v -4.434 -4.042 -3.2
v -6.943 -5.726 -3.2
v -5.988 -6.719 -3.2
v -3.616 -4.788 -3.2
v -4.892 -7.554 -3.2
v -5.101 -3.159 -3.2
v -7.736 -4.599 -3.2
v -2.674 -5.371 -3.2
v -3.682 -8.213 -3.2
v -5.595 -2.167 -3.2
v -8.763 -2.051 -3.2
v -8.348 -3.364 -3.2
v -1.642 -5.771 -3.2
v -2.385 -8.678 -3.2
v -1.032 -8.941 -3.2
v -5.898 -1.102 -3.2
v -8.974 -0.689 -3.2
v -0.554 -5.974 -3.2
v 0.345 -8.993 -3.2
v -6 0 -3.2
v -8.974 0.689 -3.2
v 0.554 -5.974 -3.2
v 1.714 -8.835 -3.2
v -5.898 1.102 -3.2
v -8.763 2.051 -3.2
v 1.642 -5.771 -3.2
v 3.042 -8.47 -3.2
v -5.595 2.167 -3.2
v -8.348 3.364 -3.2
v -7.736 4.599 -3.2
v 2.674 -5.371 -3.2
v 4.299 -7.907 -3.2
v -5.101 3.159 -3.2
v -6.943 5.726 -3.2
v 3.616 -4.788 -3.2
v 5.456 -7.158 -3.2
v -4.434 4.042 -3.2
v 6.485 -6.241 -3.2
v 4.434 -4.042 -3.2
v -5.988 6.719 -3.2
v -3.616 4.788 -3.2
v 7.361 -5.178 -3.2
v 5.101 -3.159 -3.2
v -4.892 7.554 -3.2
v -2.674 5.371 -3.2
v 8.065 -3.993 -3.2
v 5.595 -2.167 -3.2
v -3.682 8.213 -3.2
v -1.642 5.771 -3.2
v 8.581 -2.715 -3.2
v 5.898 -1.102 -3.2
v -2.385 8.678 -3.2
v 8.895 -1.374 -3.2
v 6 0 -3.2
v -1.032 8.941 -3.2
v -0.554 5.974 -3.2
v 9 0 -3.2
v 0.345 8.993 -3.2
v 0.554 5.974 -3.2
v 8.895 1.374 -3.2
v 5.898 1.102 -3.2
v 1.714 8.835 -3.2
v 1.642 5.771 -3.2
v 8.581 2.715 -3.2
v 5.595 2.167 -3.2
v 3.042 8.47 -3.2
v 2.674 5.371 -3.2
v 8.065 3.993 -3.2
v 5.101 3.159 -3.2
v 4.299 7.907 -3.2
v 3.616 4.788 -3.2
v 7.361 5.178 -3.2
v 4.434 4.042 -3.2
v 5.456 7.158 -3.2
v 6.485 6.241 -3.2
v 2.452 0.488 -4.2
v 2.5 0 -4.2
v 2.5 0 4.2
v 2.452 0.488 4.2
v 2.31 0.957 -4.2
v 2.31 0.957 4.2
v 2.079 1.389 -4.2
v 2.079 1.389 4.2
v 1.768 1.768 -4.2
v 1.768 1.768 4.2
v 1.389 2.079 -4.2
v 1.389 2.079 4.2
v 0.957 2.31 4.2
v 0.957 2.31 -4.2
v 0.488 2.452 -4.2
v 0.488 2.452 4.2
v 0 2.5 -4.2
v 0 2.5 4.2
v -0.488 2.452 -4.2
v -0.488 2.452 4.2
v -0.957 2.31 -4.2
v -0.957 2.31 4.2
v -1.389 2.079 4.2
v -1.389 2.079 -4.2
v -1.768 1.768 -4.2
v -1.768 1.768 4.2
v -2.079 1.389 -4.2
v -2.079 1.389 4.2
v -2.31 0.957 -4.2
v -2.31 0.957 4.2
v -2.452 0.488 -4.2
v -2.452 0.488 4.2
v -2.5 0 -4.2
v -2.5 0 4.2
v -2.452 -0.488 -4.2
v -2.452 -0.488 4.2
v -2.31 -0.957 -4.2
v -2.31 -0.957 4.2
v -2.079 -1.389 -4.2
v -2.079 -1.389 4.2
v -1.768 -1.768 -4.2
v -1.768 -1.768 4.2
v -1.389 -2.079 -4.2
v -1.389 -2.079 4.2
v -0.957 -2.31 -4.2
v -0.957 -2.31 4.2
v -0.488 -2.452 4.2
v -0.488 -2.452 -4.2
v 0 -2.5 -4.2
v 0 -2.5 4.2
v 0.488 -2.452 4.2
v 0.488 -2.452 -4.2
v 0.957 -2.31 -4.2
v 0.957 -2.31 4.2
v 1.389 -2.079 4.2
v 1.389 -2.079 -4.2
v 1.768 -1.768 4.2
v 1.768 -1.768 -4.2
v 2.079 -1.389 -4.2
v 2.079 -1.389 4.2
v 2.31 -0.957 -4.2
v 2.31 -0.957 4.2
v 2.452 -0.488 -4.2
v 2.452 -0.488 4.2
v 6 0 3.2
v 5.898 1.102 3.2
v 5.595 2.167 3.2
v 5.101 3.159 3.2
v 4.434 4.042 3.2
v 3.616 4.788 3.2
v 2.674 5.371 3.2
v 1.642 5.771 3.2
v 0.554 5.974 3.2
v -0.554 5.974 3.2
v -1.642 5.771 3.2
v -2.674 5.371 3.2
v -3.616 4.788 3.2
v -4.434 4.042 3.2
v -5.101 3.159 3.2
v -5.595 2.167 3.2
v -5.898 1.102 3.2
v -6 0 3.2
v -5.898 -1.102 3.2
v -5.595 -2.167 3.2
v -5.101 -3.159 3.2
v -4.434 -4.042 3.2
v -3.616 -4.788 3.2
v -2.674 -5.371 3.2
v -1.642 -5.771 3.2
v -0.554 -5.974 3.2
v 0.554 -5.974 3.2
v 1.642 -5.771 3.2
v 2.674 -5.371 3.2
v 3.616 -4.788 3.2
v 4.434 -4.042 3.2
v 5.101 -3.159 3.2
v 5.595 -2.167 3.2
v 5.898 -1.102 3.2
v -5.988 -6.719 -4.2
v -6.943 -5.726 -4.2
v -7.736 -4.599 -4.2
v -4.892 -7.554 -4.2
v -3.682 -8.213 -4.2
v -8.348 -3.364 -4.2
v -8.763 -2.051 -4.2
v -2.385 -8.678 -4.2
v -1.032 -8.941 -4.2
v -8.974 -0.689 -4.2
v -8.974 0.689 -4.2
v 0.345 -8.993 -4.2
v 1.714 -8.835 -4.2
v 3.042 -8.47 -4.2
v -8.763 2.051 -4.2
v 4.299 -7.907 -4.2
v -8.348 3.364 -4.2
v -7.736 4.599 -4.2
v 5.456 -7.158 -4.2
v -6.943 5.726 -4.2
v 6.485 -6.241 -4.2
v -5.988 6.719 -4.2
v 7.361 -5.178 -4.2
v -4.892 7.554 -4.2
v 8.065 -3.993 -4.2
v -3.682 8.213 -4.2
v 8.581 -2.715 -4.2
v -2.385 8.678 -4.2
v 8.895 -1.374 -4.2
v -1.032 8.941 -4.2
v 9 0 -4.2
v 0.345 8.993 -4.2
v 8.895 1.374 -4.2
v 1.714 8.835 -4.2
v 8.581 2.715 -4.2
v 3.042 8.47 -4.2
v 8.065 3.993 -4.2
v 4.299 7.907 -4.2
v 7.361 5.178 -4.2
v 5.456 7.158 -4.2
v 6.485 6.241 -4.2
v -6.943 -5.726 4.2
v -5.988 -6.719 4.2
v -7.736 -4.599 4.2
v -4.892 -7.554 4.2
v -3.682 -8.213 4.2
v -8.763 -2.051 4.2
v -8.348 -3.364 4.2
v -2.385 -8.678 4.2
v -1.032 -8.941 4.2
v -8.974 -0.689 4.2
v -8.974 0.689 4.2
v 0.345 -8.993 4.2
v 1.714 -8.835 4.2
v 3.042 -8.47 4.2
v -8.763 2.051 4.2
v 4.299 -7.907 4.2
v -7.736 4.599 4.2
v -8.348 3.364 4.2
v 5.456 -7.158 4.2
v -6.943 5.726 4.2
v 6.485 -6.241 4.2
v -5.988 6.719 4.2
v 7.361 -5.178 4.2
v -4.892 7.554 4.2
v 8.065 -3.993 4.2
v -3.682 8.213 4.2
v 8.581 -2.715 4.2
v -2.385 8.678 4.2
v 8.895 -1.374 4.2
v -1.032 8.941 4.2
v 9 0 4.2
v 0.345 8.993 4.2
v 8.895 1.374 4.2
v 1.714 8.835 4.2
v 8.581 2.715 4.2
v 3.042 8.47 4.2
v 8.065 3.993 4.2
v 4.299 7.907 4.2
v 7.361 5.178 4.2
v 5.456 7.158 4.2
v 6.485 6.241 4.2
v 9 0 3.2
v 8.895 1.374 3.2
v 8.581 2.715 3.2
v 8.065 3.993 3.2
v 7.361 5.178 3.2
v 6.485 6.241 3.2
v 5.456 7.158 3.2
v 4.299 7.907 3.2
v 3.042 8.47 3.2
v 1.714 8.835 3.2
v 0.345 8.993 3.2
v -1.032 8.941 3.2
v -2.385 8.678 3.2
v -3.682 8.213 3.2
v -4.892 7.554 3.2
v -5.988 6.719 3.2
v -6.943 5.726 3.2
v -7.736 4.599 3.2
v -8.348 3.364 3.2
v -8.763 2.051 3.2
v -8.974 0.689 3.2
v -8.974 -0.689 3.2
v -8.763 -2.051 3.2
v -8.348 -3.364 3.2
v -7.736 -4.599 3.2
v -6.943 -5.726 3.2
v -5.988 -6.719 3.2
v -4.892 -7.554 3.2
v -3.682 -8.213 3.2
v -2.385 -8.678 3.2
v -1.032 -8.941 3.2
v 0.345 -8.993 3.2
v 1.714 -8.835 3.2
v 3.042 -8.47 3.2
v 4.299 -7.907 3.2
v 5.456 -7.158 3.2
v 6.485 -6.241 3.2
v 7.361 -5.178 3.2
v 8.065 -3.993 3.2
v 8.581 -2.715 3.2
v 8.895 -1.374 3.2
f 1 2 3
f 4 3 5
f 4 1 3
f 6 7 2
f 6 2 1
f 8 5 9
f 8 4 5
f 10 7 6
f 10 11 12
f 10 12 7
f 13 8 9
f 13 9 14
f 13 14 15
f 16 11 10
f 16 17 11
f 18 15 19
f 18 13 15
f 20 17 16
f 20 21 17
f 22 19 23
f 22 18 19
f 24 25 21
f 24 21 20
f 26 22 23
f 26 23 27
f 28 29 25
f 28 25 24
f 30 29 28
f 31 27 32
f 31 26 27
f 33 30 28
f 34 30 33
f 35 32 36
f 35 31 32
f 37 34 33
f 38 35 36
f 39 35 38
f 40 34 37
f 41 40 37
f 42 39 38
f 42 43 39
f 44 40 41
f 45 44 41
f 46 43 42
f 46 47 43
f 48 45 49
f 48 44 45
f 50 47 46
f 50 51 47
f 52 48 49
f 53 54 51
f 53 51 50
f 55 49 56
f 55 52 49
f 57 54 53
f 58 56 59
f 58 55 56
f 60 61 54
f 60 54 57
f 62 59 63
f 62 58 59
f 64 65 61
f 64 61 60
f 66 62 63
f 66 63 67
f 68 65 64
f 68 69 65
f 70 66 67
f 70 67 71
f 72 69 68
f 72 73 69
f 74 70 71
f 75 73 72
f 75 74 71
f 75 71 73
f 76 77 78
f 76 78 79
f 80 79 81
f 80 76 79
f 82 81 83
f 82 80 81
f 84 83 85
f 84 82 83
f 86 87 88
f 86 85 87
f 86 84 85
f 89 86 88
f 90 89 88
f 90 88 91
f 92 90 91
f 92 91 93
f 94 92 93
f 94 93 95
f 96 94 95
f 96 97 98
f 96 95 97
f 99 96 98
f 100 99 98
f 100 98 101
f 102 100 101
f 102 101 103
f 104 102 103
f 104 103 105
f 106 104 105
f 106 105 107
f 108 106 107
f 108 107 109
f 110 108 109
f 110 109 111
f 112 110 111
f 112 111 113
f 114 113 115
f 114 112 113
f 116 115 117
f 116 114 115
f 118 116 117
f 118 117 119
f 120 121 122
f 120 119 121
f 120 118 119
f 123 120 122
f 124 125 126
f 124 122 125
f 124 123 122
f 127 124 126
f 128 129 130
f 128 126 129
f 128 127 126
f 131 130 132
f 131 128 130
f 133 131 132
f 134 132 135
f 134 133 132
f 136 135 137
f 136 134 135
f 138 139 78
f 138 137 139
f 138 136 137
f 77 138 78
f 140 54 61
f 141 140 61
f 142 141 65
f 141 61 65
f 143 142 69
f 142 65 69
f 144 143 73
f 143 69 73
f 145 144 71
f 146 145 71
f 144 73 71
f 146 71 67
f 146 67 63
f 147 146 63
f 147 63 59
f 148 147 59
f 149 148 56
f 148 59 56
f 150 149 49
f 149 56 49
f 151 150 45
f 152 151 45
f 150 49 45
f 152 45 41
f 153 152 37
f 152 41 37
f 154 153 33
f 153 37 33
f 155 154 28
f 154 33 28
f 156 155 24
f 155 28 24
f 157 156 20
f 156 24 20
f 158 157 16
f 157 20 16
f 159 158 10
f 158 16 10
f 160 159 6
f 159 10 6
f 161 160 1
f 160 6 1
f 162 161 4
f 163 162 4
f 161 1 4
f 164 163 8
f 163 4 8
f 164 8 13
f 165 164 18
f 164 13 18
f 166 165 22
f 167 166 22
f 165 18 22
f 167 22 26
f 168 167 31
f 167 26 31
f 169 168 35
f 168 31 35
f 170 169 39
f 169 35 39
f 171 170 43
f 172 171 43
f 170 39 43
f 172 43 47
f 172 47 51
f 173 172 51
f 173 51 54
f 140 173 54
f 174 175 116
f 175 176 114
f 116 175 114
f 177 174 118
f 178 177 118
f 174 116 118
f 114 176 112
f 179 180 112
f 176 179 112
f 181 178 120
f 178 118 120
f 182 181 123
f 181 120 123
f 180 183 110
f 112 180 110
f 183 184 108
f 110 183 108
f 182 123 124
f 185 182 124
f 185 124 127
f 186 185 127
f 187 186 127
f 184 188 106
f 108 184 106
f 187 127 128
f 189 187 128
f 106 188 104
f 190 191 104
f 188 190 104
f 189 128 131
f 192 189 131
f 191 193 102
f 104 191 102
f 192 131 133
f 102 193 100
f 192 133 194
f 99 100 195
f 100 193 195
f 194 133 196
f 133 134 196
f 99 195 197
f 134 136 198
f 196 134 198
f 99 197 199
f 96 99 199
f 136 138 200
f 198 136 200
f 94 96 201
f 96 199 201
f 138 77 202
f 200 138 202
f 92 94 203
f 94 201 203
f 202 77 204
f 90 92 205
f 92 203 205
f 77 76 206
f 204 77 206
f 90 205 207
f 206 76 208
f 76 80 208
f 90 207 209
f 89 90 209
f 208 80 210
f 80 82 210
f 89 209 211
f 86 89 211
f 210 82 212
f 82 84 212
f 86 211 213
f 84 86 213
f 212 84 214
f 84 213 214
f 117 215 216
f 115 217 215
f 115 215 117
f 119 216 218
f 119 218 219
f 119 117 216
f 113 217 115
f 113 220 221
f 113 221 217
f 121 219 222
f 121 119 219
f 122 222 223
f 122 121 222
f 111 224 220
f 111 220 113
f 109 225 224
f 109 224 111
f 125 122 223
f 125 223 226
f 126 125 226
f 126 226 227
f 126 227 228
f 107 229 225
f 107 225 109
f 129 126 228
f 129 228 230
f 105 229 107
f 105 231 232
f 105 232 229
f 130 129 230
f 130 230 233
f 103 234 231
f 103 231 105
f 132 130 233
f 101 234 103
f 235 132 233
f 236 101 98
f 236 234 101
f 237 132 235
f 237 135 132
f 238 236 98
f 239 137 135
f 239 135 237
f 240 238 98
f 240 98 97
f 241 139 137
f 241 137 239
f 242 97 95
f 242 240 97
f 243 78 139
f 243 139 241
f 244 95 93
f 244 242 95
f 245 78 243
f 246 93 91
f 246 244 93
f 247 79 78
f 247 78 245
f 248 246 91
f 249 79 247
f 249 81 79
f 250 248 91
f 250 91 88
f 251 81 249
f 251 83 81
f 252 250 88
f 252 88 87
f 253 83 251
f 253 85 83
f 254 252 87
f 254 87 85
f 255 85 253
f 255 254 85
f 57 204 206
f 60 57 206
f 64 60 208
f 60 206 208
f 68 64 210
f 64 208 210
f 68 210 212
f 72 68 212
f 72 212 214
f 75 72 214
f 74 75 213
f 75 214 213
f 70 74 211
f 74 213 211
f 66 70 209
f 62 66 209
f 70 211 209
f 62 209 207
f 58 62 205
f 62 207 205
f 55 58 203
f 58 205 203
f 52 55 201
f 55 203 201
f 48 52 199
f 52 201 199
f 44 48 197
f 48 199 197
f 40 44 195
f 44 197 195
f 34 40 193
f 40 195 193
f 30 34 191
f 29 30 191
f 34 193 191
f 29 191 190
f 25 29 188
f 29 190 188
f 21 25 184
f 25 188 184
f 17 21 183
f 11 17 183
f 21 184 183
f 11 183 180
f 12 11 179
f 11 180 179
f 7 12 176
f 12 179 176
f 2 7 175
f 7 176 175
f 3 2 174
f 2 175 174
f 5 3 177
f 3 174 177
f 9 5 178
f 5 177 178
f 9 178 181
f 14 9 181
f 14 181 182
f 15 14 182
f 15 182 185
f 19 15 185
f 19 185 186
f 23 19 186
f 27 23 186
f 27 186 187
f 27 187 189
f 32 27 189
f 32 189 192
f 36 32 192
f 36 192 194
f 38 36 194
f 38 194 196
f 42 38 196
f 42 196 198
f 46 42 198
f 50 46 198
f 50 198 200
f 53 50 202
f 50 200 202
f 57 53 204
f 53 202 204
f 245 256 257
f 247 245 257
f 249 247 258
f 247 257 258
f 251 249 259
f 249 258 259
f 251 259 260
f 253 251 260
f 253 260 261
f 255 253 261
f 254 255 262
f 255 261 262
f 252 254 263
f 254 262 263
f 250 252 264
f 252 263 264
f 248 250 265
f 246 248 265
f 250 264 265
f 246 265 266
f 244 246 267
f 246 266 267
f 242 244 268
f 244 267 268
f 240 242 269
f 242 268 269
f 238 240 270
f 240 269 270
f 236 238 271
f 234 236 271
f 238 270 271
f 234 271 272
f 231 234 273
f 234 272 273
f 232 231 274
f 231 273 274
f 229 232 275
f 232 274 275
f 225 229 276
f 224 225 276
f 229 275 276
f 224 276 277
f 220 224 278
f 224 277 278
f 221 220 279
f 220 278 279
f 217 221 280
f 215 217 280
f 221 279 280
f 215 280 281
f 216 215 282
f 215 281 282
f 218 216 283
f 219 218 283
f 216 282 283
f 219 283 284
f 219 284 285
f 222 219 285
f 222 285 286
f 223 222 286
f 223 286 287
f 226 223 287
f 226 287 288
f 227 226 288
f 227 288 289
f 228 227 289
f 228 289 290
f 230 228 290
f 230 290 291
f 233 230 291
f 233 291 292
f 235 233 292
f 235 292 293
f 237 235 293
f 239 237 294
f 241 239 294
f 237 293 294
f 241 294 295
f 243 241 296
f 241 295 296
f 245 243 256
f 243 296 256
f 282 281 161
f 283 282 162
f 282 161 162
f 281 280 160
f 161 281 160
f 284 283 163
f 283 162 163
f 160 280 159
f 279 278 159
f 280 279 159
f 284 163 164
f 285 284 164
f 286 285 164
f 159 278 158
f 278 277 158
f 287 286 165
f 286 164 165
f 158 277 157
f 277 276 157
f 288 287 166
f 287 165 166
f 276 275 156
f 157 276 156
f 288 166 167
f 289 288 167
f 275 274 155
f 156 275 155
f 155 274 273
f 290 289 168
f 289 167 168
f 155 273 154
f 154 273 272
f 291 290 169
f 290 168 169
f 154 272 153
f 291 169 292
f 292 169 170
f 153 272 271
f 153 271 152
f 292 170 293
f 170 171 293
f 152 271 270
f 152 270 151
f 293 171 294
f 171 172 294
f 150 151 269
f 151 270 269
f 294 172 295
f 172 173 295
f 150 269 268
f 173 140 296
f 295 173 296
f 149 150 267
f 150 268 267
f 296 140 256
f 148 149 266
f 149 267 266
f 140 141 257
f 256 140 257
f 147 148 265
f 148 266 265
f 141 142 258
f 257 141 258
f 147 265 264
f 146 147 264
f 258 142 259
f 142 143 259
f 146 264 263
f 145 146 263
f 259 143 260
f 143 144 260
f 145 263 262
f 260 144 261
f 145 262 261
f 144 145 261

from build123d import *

# Parameters (mm, degrees)
CYLINDER003_R     = 2.5
CYLINDER003_DEPTH = 10
CYLINDER001_R     = 9
CYLINDER001_DEPTH = 1
CYLINDER_R        = 6
CYLINDER_DEPTH    = 6.4
CYLINDER002_R     = 9
CYLINDER002_DEPTH = 1


with BuildPart() as cilindro003:
    # Cylinder003 → Cylinder003 (new body)
    with BuildSketch(Plane.XY.offset(-5)):
        Circle(CYLINDER003_R)
    extrude(amount=CYLINDER003_DEPTH)


with BuildPart() as cilindro001:
    # Cylinder001 → Cylinder001 (new body)
    with BuildSketch(Plane.XY.offset(3.2)):
        Circle(CYLINDER001_R)
    extrude(amount=CYLINDER001_DEPTH)


with BuildPart() as fusion:
    # Cylinder → Cylinder (new body)
    with BuildSketch(Plane.XY.offset(-3.2)):
        Circle(CYLINDER_R)
    extrude(amount=CYLINDER_DEPTH)

    # Fusion: union Cilindro001
    add(cilindro001.part)


with BuildPart() as pulley:
    # Cylinder002 → Cylinder002 (new body)
    with BuildSketch(Plane.XY.offset(-4.2)):
        Circle(CYLINDER002_R)
    extrude(amount=CYLINDER002_DEPTH)

    # Fusion001: union Fusion
    add(fusion.part)

    # Cut: cut Cilindro003
    add(cilindro003.part, mode=Mode.SUBTRACT)


solid = pulley.part
